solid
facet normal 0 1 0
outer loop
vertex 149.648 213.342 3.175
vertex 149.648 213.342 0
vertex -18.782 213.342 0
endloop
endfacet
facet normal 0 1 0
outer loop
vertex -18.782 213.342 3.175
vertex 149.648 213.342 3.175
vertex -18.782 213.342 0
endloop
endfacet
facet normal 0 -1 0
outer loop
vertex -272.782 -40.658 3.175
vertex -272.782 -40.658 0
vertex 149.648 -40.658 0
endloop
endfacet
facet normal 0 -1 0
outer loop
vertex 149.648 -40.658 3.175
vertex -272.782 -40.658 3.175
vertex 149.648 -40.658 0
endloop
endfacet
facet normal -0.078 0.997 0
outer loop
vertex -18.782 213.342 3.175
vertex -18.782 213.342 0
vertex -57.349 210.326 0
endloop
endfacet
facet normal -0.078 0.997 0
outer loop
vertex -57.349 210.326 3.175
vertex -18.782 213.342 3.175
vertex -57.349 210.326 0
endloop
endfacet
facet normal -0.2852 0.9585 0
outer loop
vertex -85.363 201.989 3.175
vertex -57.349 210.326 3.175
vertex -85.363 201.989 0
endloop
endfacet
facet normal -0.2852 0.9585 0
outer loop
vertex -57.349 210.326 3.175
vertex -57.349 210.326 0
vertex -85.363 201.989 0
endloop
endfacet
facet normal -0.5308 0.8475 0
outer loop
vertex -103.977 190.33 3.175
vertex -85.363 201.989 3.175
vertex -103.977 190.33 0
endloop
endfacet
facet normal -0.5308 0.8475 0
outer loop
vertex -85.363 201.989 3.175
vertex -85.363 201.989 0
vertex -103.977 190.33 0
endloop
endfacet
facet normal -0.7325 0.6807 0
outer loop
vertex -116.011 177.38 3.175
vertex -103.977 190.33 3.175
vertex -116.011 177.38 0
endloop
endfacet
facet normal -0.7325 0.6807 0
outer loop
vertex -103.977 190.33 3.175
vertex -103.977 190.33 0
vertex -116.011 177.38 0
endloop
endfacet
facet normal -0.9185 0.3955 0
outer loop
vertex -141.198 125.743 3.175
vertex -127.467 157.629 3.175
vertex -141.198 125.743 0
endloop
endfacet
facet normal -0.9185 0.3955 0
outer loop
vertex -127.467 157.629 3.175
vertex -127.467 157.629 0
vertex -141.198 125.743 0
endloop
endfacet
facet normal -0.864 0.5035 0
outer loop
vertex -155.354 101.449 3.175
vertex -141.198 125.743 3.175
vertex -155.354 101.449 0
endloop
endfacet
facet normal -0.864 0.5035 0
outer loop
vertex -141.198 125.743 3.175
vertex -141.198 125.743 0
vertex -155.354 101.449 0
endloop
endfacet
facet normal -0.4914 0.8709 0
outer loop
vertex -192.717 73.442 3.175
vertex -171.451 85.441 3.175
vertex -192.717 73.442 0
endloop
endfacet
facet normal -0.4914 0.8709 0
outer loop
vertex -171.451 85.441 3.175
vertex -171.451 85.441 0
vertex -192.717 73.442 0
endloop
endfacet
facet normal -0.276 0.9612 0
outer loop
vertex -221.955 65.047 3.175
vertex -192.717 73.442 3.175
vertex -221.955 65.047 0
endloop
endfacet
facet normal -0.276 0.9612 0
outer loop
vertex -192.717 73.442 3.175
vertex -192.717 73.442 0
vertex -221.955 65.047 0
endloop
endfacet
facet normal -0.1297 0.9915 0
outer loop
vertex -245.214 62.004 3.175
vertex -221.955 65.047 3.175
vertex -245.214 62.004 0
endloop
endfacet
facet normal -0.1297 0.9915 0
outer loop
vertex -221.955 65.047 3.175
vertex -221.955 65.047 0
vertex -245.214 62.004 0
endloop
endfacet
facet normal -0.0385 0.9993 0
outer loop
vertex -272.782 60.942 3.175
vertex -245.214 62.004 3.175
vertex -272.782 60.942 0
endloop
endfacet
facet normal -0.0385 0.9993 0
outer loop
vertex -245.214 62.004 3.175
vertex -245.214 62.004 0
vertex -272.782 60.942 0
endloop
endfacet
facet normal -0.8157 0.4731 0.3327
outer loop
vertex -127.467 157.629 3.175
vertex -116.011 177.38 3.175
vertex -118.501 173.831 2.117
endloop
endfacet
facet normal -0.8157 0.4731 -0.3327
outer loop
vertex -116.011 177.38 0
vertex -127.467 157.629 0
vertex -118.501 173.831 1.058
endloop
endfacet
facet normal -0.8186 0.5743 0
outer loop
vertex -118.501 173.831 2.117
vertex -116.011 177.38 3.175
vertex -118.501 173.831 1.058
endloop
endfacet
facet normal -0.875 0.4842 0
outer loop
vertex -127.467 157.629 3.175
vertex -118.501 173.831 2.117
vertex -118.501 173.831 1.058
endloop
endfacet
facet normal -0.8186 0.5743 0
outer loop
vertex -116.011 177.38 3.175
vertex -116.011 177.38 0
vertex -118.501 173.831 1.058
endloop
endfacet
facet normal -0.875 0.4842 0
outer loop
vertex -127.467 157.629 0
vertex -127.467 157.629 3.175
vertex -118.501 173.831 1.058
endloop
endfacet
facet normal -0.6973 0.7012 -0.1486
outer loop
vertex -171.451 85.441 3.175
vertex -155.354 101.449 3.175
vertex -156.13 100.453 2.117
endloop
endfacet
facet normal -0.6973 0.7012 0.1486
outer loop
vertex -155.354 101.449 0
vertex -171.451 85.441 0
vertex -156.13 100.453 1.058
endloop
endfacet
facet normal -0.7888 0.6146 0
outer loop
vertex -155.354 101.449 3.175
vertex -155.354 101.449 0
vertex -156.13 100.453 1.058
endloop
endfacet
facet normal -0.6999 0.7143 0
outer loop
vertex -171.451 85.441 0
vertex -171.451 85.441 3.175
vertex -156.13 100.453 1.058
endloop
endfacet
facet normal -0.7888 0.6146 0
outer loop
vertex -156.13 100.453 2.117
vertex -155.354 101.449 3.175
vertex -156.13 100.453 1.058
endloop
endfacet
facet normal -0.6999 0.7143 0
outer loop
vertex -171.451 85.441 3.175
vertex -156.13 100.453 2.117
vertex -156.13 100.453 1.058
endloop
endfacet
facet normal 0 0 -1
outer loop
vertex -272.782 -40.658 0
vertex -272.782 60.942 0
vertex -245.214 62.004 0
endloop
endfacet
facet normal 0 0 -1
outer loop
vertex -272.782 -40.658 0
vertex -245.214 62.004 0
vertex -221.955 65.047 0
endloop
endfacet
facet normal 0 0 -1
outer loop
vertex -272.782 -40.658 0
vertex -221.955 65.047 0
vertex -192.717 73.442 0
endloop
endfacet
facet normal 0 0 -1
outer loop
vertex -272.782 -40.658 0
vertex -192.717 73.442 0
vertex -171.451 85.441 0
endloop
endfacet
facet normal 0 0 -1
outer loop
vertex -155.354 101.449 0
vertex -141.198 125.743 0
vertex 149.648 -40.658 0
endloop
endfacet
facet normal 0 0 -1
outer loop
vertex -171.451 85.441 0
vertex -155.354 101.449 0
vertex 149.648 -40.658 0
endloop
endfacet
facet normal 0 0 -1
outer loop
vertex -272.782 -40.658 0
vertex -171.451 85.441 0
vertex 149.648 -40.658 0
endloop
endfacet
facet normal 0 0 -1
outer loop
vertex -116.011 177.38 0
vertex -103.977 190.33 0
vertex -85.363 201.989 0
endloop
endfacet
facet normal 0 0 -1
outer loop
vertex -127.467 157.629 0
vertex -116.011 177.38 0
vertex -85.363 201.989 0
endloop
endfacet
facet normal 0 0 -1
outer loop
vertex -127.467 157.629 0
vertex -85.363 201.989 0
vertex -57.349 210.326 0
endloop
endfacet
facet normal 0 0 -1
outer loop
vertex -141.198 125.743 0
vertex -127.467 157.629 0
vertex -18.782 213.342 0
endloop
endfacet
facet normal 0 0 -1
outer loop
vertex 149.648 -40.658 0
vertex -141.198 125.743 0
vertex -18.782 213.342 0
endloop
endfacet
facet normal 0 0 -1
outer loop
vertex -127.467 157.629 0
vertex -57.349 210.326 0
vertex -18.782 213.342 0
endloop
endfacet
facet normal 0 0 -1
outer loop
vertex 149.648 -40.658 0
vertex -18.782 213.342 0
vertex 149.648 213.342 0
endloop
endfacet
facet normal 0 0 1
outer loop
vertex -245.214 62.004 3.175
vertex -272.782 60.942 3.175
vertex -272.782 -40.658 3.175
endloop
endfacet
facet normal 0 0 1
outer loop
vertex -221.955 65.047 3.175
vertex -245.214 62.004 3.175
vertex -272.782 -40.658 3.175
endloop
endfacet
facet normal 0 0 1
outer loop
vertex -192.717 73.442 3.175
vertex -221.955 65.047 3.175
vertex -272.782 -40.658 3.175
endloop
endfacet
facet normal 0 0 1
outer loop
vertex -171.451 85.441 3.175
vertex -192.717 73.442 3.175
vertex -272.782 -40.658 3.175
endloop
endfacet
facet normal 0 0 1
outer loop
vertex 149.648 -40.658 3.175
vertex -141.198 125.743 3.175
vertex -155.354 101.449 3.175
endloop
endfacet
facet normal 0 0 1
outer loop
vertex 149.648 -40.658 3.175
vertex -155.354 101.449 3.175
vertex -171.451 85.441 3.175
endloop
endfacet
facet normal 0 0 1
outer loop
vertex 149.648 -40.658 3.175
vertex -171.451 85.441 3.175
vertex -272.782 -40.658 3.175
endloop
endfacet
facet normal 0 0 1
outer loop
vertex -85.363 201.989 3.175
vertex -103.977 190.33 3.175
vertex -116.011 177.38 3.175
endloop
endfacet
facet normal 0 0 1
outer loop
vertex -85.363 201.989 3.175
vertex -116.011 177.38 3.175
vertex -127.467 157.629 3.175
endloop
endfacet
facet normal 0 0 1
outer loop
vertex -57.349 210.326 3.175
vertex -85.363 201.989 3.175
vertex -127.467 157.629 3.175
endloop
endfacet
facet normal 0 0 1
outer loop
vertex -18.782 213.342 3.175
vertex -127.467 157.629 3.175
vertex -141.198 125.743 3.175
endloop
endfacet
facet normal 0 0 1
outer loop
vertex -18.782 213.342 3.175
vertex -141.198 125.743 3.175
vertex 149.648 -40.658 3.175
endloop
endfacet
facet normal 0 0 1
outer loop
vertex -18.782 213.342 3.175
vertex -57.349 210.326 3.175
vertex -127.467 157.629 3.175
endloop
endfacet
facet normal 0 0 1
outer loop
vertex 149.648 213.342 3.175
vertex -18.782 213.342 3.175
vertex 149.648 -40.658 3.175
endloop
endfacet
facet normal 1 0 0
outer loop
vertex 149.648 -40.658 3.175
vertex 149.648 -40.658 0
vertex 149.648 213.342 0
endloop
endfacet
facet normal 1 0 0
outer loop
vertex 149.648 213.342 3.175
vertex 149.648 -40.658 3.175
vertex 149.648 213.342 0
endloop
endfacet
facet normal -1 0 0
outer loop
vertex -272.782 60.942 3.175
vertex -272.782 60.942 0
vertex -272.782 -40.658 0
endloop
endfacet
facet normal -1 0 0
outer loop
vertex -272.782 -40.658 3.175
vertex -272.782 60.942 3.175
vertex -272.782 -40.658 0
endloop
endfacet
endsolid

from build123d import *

# Parameters (mm, degrees)
BOSS_EXTRUDE1_DEPTH = 3.175


with BuildPart() as part:
    # Sketch1 → Boss-Extrude1 (new body)
    with BuildSketch(Plane.XY):
        with BuildLine():
            Line((149.647712361, 213.341972064), (-18.782287639, 213.341972064))
            add(Edge.make_bspline(
                [(-18.782287639, 213.341972064), (-196.582287639, 213.341972064), (-69.582287639, 60.941972064), (-272.782287639, 60.941972064)],
                knots=[0, 0, 0, 0, 1, 1, 1, 1], degree=3))
            Line((-272.782287639, 60.941972064), (-272.782287639, -40.658027936))
            Line((-272.782287639, -40.658027936), (149.647712361, -40.658027936))
            Line((149.647712361, -40.658027936), (149.647712361, 213.341972064))
        make_face()
    extrude(amount=BOSS_EXTRUDE1_DEPTH)


solid = part.part
